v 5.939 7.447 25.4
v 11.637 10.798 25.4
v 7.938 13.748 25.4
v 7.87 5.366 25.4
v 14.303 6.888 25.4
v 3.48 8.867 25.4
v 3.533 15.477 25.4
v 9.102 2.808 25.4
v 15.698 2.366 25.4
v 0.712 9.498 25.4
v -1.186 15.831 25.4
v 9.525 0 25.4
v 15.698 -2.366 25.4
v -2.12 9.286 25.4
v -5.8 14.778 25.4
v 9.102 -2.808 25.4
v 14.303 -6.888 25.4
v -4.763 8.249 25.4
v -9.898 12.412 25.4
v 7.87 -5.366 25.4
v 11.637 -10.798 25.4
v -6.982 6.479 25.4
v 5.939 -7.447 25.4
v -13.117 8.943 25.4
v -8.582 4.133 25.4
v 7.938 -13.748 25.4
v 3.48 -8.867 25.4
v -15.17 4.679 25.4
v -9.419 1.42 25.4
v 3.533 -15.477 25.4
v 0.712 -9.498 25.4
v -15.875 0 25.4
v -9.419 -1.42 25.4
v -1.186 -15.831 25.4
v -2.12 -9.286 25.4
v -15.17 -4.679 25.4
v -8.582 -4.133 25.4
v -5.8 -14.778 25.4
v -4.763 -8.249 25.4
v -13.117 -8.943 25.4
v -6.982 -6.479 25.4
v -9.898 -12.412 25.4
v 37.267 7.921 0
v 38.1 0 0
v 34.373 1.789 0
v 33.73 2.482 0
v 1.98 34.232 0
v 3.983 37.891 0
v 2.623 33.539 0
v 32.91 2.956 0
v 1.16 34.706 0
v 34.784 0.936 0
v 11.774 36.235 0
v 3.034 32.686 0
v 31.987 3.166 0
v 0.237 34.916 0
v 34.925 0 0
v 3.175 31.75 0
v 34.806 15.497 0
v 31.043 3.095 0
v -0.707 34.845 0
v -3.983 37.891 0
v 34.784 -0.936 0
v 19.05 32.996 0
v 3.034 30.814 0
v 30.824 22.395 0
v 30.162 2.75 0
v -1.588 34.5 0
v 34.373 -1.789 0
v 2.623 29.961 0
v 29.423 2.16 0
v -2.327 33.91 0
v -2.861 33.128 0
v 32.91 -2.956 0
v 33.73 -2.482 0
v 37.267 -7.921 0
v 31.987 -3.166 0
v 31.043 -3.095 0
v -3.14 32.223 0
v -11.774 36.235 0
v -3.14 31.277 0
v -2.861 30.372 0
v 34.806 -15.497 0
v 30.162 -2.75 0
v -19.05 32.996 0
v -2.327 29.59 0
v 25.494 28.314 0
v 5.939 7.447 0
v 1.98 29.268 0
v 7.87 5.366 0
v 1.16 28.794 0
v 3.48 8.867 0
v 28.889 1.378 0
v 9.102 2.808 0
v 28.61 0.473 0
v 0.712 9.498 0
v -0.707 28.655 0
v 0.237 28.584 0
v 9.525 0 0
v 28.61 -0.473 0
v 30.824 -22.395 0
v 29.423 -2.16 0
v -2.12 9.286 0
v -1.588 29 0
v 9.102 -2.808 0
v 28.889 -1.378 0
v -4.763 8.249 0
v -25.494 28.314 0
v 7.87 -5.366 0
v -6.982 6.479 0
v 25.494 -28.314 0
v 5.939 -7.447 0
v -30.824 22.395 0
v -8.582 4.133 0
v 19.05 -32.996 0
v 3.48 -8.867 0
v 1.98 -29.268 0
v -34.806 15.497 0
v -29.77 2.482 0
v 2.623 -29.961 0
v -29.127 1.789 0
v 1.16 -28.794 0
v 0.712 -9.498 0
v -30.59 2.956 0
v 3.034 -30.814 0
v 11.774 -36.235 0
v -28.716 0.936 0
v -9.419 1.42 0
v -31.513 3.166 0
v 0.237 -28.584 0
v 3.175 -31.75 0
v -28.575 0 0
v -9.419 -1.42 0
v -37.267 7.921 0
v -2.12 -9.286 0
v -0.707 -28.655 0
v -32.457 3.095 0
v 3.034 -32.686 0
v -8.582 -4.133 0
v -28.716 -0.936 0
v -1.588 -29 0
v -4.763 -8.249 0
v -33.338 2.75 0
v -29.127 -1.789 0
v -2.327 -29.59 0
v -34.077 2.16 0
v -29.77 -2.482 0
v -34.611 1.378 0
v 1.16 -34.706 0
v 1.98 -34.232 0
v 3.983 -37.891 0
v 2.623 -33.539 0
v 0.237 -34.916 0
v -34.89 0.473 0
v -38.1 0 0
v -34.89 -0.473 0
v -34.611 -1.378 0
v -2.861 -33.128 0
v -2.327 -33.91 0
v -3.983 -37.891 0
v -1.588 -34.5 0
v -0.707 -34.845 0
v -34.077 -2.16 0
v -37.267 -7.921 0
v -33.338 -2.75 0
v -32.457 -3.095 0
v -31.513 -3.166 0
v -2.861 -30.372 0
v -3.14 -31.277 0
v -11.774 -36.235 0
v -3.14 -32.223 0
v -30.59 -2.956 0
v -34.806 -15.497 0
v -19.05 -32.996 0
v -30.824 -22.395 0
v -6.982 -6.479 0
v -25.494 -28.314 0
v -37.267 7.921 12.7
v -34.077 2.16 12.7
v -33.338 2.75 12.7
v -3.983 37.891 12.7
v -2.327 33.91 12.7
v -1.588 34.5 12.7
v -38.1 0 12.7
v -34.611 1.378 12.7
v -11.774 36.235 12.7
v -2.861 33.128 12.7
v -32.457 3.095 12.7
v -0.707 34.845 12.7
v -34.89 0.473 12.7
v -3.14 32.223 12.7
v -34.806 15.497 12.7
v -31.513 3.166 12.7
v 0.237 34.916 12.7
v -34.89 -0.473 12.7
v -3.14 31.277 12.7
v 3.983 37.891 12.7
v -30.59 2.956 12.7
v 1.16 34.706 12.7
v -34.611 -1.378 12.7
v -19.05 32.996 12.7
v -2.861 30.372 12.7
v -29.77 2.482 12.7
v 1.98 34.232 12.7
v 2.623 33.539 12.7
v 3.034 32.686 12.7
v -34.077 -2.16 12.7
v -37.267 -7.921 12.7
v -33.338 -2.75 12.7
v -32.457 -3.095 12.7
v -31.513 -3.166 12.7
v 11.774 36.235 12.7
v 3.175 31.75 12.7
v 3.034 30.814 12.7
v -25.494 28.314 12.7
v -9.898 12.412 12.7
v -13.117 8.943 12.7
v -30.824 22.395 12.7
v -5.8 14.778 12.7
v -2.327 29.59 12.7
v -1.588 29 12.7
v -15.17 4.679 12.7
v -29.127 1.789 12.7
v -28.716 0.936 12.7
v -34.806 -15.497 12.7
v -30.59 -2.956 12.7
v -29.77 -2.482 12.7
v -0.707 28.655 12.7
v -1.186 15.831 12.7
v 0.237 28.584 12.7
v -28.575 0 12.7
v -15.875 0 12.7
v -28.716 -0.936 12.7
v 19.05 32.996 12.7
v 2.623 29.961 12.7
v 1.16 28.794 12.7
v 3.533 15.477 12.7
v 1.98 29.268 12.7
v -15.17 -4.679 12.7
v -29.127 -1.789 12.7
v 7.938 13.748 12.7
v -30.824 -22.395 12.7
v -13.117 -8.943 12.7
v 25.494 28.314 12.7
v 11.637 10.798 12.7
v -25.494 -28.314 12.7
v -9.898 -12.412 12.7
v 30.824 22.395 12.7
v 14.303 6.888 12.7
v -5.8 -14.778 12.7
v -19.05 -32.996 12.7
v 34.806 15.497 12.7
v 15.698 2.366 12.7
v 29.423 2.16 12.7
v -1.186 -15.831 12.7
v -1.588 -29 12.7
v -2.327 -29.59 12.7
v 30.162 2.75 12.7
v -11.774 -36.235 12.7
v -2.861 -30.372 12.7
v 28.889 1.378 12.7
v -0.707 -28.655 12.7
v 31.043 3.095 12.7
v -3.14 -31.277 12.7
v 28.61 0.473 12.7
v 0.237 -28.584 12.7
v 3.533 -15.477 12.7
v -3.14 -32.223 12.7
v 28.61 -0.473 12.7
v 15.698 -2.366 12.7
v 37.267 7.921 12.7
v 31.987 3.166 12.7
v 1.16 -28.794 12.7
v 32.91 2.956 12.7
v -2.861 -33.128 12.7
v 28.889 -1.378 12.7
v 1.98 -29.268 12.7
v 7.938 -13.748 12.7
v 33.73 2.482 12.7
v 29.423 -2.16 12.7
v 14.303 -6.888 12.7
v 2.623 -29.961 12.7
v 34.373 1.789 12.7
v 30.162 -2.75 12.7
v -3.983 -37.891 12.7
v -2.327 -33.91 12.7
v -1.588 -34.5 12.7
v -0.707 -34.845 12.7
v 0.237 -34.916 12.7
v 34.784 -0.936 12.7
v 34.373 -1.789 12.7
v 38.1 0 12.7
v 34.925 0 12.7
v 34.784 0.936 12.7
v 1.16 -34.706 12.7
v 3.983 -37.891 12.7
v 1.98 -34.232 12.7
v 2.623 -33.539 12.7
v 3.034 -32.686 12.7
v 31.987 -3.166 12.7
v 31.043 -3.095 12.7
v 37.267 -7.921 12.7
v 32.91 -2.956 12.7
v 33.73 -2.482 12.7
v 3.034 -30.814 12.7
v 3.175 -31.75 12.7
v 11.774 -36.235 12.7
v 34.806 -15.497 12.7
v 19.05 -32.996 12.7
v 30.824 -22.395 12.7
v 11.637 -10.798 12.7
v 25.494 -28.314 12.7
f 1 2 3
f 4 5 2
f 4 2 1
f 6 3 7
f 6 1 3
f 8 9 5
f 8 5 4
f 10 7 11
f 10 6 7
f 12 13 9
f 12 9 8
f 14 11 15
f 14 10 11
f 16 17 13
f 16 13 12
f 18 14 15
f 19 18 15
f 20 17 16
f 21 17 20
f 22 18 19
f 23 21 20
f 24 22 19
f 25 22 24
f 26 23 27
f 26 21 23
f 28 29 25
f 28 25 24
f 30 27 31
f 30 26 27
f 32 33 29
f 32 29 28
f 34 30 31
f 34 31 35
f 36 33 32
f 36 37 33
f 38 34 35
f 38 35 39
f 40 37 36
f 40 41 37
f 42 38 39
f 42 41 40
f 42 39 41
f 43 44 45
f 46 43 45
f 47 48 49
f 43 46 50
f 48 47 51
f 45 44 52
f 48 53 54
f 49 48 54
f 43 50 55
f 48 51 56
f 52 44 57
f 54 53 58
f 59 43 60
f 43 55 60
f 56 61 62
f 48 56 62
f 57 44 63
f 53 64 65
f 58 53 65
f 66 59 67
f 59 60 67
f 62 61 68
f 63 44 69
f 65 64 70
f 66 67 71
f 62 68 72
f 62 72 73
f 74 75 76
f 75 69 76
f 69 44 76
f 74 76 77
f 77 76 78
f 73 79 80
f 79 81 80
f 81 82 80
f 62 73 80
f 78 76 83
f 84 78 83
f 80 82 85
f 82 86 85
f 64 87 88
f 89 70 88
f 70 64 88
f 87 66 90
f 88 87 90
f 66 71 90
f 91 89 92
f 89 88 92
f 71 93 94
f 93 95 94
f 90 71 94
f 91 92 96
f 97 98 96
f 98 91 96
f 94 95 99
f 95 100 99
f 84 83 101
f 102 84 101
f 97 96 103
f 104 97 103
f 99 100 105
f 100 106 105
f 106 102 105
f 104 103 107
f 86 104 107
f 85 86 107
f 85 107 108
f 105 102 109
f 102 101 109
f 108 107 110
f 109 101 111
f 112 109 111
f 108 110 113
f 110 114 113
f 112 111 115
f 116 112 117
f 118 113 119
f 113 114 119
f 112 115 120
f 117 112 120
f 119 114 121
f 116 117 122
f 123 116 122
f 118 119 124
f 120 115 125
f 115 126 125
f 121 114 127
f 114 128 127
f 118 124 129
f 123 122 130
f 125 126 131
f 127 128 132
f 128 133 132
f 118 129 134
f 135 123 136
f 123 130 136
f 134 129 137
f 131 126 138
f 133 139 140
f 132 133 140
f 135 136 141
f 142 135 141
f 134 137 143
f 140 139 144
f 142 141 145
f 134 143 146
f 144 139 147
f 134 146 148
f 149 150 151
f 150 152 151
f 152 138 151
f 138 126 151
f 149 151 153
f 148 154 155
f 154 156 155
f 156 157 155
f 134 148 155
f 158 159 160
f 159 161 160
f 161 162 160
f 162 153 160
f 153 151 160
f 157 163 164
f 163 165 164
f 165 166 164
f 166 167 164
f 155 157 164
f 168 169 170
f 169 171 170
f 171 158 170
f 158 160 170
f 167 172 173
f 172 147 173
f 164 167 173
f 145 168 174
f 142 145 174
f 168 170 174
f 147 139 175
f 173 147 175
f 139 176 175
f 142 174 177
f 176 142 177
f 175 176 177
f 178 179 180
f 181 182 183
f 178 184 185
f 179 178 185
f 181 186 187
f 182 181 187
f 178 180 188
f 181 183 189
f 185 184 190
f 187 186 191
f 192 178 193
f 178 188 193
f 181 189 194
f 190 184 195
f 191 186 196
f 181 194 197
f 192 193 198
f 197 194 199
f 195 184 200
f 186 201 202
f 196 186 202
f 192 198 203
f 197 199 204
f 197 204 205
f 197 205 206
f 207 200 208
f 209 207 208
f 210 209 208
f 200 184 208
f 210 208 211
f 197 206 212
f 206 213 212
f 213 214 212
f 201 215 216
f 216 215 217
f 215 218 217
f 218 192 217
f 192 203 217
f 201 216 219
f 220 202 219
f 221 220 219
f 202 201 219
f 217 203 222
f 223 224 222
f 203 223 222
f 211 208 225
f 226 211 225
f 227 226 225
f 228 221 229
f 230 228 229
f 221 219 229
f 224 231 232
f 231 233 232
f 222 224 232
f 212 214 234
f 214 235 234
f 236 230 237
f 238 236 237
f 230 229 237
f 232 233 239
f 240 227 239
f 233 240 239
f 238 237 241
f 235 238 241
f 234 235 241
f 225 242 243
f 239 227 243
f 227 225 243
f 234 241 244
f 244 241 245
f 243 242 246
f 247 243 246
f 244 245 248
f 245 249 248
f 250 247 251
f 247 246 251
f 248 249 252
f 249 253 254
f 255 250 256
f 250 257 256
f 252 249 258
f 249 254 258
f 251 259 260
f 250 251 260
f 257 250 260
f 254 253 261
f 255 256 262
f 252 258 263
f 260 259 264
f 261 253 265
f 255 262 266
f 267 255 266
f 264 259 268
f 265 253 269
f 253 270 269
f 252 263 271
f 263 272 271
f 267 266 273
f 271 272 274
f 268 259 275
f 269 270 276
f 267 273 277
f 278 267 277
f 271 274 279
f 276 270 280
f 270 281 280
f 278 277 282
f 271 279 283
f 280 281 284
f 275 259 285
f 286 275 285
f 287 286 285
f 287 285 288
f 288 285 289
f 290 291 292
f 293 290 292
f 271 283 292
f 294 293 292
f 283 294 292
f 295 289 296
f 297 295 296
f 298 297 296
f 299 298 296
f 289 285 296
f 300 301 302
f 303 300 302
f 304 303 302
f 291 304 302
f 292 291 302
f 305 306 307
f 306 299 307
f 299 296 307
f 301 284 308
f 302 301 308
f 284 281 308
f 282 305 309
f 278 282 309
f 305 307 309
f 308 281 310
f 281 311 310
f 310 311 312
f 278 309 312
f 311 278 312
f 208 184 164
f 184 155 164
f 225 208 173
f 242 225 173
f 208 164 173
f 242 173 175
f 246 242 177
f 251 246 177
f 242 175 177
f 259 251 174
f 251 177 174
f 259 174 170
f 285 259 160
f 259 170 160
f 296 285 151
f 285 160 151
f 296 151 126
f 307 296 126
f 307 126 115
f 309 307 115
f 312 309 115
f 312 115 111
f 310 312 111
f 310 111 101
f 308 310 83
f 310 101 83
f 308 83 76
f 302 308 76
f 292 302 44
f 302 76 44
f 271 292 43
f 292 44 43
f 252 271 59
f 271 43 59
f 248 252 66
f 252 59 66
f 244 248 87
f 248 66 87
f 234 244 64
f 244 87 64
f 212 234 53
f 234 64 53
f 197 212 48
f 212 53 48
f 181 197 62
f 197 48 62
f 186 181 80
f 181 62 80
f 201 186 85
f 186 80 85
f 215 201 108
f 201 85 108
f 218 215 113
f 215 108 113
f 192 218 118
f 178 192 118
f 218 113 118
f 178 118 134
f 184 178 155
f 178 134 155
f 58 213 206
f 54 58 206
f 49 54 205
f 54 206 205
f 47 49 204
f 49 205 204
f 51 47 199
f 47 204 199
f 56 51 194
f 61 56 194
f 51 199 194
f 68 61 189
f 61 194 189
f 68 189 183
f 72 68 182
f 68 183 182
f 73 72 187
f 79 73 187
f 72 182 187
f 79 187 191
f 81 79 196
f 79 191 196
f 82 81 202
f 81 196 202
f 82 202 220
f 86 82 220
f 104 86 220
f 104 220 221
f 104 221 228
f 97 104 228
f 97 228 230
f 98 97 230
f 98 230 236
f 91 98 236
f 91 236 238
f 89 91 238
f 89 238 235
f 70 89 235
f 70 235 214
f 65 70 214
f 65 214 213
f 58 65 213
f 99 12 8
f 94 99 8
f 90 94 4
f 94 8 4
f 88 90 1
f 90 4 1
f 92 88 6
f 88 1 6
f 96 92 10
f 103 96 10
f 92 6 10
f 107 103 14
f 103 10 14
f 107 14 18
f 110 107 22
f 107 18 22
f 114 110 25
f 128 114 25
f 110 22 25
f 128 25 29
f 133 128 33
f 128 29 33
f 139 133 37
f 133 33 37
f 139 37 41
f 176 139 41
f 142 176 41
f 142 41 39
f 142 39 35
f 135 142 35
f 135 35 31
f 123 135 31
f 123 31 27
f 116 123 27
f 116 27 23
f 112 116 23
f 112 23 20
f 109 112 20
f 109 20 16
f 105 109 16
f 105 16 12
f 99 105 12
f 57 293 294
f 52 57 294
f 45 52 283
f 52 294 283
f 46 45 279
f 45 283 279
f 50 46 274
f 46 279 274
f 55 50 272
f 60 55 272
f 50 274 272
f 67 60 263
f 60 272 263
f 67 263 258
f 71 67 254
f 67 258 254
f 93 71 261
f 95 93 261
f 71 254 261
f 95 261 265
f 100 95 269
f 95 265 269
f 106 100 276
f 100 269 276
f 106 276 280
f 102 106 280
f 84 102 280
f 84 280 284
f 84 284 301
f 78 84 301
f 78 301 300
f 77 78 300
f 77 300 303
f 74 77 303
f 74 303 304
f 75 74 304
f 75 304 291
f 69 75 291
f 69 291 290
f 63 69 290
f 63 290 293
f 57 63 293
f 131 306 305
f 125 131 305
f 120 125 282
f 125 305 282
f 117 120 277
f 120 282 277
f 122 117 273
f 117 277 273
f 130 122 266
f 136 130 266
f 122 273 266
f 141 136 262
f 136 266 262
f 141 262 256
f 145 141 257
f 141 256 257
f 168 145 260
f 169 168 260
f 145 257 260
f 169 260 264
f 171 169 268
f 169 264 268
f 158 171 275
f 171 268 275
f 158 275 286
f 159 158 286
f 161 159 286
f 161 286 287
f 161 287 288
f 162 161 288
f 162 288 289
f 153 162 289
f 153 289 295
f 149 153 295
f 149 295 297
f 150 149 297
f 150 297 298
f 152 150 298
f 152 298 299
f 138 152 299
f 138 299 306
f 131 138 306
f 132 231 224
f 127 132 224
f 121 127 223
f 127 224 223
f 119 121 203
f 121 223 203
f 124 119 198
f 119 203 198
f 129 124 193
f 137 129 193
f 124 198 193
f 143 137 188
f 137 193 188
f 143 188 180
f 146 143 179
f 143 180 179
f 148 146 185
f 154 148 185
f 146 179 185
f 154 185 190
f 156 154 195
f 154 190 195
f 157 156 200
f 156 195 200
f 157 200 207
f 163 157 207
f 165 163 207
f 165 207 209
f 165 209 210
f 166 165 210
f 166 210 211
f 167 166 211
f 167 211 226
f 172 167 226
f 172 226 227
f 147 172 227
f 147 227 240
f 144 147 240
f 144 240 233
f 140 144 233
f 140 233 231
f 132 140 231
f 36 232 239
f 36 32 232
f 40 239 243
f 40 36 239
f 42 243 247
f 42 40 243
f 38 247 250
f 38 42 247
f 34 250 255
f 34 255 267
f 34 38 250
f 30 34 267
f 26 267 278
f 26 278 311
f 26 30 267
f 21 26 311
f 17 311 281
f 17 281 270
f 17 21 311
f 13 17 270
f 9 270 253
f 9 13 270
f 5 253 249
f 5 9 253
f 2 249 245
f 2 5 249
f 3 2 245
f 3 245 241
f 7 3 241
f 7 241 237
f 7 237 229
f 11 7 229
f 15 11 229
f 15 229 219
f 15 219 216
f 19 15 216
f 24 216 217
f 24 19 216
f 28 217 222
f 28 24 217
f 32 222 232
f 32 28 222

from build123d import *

# Parameters (mm, degrees)
F0_W     = 15.875
F0_H     = 12.7
F2_R     = 3.175
F3_DEPTH = 25.4
F4_R     = 9.525
F5_DEPTH = 50.5226


with BuildPart() as f1:
    # F0 (on Front) → F1 (revolve)
    with BuildSketch(Plane.XZ):
        Polygon((-38.1, 0), (0, 0), (0, 12.7), (-15.875, 12.7), (-38.1, 12.7), align=None)
        with Locations((-7.9375, 19.05)):
            Rectangle(F0_W, F0_H)
    revolve(axis=Axis((0, 0, 18.219382), (0, 0, 1)))

    # F2 (on face) → F3 (cut)
    with BuildSketch(Plane.XY.offset(12.7)):
        with Locations((0, 31.75)):
            Circle(F2_R)
        with Locations((-31.75, 0)):
            Circle(F2_R)
        with Locations((0, -31.75)):
            Circle(F2_R)
        with Locations((31.75, 0)):
            Circle(F2_R)
    extrude(amount=-F3_DEPTH, mode=Mode.SUBTRACT)

    # F4 (on face) → F5 (cut)
    with BuildSketch(Plane.XY.offset(25.4)):
        Circle(F4_R)
    extrude(amount=-F5_DEPTH, mode=Mode.SUBTRACT)


solid = f1.part
